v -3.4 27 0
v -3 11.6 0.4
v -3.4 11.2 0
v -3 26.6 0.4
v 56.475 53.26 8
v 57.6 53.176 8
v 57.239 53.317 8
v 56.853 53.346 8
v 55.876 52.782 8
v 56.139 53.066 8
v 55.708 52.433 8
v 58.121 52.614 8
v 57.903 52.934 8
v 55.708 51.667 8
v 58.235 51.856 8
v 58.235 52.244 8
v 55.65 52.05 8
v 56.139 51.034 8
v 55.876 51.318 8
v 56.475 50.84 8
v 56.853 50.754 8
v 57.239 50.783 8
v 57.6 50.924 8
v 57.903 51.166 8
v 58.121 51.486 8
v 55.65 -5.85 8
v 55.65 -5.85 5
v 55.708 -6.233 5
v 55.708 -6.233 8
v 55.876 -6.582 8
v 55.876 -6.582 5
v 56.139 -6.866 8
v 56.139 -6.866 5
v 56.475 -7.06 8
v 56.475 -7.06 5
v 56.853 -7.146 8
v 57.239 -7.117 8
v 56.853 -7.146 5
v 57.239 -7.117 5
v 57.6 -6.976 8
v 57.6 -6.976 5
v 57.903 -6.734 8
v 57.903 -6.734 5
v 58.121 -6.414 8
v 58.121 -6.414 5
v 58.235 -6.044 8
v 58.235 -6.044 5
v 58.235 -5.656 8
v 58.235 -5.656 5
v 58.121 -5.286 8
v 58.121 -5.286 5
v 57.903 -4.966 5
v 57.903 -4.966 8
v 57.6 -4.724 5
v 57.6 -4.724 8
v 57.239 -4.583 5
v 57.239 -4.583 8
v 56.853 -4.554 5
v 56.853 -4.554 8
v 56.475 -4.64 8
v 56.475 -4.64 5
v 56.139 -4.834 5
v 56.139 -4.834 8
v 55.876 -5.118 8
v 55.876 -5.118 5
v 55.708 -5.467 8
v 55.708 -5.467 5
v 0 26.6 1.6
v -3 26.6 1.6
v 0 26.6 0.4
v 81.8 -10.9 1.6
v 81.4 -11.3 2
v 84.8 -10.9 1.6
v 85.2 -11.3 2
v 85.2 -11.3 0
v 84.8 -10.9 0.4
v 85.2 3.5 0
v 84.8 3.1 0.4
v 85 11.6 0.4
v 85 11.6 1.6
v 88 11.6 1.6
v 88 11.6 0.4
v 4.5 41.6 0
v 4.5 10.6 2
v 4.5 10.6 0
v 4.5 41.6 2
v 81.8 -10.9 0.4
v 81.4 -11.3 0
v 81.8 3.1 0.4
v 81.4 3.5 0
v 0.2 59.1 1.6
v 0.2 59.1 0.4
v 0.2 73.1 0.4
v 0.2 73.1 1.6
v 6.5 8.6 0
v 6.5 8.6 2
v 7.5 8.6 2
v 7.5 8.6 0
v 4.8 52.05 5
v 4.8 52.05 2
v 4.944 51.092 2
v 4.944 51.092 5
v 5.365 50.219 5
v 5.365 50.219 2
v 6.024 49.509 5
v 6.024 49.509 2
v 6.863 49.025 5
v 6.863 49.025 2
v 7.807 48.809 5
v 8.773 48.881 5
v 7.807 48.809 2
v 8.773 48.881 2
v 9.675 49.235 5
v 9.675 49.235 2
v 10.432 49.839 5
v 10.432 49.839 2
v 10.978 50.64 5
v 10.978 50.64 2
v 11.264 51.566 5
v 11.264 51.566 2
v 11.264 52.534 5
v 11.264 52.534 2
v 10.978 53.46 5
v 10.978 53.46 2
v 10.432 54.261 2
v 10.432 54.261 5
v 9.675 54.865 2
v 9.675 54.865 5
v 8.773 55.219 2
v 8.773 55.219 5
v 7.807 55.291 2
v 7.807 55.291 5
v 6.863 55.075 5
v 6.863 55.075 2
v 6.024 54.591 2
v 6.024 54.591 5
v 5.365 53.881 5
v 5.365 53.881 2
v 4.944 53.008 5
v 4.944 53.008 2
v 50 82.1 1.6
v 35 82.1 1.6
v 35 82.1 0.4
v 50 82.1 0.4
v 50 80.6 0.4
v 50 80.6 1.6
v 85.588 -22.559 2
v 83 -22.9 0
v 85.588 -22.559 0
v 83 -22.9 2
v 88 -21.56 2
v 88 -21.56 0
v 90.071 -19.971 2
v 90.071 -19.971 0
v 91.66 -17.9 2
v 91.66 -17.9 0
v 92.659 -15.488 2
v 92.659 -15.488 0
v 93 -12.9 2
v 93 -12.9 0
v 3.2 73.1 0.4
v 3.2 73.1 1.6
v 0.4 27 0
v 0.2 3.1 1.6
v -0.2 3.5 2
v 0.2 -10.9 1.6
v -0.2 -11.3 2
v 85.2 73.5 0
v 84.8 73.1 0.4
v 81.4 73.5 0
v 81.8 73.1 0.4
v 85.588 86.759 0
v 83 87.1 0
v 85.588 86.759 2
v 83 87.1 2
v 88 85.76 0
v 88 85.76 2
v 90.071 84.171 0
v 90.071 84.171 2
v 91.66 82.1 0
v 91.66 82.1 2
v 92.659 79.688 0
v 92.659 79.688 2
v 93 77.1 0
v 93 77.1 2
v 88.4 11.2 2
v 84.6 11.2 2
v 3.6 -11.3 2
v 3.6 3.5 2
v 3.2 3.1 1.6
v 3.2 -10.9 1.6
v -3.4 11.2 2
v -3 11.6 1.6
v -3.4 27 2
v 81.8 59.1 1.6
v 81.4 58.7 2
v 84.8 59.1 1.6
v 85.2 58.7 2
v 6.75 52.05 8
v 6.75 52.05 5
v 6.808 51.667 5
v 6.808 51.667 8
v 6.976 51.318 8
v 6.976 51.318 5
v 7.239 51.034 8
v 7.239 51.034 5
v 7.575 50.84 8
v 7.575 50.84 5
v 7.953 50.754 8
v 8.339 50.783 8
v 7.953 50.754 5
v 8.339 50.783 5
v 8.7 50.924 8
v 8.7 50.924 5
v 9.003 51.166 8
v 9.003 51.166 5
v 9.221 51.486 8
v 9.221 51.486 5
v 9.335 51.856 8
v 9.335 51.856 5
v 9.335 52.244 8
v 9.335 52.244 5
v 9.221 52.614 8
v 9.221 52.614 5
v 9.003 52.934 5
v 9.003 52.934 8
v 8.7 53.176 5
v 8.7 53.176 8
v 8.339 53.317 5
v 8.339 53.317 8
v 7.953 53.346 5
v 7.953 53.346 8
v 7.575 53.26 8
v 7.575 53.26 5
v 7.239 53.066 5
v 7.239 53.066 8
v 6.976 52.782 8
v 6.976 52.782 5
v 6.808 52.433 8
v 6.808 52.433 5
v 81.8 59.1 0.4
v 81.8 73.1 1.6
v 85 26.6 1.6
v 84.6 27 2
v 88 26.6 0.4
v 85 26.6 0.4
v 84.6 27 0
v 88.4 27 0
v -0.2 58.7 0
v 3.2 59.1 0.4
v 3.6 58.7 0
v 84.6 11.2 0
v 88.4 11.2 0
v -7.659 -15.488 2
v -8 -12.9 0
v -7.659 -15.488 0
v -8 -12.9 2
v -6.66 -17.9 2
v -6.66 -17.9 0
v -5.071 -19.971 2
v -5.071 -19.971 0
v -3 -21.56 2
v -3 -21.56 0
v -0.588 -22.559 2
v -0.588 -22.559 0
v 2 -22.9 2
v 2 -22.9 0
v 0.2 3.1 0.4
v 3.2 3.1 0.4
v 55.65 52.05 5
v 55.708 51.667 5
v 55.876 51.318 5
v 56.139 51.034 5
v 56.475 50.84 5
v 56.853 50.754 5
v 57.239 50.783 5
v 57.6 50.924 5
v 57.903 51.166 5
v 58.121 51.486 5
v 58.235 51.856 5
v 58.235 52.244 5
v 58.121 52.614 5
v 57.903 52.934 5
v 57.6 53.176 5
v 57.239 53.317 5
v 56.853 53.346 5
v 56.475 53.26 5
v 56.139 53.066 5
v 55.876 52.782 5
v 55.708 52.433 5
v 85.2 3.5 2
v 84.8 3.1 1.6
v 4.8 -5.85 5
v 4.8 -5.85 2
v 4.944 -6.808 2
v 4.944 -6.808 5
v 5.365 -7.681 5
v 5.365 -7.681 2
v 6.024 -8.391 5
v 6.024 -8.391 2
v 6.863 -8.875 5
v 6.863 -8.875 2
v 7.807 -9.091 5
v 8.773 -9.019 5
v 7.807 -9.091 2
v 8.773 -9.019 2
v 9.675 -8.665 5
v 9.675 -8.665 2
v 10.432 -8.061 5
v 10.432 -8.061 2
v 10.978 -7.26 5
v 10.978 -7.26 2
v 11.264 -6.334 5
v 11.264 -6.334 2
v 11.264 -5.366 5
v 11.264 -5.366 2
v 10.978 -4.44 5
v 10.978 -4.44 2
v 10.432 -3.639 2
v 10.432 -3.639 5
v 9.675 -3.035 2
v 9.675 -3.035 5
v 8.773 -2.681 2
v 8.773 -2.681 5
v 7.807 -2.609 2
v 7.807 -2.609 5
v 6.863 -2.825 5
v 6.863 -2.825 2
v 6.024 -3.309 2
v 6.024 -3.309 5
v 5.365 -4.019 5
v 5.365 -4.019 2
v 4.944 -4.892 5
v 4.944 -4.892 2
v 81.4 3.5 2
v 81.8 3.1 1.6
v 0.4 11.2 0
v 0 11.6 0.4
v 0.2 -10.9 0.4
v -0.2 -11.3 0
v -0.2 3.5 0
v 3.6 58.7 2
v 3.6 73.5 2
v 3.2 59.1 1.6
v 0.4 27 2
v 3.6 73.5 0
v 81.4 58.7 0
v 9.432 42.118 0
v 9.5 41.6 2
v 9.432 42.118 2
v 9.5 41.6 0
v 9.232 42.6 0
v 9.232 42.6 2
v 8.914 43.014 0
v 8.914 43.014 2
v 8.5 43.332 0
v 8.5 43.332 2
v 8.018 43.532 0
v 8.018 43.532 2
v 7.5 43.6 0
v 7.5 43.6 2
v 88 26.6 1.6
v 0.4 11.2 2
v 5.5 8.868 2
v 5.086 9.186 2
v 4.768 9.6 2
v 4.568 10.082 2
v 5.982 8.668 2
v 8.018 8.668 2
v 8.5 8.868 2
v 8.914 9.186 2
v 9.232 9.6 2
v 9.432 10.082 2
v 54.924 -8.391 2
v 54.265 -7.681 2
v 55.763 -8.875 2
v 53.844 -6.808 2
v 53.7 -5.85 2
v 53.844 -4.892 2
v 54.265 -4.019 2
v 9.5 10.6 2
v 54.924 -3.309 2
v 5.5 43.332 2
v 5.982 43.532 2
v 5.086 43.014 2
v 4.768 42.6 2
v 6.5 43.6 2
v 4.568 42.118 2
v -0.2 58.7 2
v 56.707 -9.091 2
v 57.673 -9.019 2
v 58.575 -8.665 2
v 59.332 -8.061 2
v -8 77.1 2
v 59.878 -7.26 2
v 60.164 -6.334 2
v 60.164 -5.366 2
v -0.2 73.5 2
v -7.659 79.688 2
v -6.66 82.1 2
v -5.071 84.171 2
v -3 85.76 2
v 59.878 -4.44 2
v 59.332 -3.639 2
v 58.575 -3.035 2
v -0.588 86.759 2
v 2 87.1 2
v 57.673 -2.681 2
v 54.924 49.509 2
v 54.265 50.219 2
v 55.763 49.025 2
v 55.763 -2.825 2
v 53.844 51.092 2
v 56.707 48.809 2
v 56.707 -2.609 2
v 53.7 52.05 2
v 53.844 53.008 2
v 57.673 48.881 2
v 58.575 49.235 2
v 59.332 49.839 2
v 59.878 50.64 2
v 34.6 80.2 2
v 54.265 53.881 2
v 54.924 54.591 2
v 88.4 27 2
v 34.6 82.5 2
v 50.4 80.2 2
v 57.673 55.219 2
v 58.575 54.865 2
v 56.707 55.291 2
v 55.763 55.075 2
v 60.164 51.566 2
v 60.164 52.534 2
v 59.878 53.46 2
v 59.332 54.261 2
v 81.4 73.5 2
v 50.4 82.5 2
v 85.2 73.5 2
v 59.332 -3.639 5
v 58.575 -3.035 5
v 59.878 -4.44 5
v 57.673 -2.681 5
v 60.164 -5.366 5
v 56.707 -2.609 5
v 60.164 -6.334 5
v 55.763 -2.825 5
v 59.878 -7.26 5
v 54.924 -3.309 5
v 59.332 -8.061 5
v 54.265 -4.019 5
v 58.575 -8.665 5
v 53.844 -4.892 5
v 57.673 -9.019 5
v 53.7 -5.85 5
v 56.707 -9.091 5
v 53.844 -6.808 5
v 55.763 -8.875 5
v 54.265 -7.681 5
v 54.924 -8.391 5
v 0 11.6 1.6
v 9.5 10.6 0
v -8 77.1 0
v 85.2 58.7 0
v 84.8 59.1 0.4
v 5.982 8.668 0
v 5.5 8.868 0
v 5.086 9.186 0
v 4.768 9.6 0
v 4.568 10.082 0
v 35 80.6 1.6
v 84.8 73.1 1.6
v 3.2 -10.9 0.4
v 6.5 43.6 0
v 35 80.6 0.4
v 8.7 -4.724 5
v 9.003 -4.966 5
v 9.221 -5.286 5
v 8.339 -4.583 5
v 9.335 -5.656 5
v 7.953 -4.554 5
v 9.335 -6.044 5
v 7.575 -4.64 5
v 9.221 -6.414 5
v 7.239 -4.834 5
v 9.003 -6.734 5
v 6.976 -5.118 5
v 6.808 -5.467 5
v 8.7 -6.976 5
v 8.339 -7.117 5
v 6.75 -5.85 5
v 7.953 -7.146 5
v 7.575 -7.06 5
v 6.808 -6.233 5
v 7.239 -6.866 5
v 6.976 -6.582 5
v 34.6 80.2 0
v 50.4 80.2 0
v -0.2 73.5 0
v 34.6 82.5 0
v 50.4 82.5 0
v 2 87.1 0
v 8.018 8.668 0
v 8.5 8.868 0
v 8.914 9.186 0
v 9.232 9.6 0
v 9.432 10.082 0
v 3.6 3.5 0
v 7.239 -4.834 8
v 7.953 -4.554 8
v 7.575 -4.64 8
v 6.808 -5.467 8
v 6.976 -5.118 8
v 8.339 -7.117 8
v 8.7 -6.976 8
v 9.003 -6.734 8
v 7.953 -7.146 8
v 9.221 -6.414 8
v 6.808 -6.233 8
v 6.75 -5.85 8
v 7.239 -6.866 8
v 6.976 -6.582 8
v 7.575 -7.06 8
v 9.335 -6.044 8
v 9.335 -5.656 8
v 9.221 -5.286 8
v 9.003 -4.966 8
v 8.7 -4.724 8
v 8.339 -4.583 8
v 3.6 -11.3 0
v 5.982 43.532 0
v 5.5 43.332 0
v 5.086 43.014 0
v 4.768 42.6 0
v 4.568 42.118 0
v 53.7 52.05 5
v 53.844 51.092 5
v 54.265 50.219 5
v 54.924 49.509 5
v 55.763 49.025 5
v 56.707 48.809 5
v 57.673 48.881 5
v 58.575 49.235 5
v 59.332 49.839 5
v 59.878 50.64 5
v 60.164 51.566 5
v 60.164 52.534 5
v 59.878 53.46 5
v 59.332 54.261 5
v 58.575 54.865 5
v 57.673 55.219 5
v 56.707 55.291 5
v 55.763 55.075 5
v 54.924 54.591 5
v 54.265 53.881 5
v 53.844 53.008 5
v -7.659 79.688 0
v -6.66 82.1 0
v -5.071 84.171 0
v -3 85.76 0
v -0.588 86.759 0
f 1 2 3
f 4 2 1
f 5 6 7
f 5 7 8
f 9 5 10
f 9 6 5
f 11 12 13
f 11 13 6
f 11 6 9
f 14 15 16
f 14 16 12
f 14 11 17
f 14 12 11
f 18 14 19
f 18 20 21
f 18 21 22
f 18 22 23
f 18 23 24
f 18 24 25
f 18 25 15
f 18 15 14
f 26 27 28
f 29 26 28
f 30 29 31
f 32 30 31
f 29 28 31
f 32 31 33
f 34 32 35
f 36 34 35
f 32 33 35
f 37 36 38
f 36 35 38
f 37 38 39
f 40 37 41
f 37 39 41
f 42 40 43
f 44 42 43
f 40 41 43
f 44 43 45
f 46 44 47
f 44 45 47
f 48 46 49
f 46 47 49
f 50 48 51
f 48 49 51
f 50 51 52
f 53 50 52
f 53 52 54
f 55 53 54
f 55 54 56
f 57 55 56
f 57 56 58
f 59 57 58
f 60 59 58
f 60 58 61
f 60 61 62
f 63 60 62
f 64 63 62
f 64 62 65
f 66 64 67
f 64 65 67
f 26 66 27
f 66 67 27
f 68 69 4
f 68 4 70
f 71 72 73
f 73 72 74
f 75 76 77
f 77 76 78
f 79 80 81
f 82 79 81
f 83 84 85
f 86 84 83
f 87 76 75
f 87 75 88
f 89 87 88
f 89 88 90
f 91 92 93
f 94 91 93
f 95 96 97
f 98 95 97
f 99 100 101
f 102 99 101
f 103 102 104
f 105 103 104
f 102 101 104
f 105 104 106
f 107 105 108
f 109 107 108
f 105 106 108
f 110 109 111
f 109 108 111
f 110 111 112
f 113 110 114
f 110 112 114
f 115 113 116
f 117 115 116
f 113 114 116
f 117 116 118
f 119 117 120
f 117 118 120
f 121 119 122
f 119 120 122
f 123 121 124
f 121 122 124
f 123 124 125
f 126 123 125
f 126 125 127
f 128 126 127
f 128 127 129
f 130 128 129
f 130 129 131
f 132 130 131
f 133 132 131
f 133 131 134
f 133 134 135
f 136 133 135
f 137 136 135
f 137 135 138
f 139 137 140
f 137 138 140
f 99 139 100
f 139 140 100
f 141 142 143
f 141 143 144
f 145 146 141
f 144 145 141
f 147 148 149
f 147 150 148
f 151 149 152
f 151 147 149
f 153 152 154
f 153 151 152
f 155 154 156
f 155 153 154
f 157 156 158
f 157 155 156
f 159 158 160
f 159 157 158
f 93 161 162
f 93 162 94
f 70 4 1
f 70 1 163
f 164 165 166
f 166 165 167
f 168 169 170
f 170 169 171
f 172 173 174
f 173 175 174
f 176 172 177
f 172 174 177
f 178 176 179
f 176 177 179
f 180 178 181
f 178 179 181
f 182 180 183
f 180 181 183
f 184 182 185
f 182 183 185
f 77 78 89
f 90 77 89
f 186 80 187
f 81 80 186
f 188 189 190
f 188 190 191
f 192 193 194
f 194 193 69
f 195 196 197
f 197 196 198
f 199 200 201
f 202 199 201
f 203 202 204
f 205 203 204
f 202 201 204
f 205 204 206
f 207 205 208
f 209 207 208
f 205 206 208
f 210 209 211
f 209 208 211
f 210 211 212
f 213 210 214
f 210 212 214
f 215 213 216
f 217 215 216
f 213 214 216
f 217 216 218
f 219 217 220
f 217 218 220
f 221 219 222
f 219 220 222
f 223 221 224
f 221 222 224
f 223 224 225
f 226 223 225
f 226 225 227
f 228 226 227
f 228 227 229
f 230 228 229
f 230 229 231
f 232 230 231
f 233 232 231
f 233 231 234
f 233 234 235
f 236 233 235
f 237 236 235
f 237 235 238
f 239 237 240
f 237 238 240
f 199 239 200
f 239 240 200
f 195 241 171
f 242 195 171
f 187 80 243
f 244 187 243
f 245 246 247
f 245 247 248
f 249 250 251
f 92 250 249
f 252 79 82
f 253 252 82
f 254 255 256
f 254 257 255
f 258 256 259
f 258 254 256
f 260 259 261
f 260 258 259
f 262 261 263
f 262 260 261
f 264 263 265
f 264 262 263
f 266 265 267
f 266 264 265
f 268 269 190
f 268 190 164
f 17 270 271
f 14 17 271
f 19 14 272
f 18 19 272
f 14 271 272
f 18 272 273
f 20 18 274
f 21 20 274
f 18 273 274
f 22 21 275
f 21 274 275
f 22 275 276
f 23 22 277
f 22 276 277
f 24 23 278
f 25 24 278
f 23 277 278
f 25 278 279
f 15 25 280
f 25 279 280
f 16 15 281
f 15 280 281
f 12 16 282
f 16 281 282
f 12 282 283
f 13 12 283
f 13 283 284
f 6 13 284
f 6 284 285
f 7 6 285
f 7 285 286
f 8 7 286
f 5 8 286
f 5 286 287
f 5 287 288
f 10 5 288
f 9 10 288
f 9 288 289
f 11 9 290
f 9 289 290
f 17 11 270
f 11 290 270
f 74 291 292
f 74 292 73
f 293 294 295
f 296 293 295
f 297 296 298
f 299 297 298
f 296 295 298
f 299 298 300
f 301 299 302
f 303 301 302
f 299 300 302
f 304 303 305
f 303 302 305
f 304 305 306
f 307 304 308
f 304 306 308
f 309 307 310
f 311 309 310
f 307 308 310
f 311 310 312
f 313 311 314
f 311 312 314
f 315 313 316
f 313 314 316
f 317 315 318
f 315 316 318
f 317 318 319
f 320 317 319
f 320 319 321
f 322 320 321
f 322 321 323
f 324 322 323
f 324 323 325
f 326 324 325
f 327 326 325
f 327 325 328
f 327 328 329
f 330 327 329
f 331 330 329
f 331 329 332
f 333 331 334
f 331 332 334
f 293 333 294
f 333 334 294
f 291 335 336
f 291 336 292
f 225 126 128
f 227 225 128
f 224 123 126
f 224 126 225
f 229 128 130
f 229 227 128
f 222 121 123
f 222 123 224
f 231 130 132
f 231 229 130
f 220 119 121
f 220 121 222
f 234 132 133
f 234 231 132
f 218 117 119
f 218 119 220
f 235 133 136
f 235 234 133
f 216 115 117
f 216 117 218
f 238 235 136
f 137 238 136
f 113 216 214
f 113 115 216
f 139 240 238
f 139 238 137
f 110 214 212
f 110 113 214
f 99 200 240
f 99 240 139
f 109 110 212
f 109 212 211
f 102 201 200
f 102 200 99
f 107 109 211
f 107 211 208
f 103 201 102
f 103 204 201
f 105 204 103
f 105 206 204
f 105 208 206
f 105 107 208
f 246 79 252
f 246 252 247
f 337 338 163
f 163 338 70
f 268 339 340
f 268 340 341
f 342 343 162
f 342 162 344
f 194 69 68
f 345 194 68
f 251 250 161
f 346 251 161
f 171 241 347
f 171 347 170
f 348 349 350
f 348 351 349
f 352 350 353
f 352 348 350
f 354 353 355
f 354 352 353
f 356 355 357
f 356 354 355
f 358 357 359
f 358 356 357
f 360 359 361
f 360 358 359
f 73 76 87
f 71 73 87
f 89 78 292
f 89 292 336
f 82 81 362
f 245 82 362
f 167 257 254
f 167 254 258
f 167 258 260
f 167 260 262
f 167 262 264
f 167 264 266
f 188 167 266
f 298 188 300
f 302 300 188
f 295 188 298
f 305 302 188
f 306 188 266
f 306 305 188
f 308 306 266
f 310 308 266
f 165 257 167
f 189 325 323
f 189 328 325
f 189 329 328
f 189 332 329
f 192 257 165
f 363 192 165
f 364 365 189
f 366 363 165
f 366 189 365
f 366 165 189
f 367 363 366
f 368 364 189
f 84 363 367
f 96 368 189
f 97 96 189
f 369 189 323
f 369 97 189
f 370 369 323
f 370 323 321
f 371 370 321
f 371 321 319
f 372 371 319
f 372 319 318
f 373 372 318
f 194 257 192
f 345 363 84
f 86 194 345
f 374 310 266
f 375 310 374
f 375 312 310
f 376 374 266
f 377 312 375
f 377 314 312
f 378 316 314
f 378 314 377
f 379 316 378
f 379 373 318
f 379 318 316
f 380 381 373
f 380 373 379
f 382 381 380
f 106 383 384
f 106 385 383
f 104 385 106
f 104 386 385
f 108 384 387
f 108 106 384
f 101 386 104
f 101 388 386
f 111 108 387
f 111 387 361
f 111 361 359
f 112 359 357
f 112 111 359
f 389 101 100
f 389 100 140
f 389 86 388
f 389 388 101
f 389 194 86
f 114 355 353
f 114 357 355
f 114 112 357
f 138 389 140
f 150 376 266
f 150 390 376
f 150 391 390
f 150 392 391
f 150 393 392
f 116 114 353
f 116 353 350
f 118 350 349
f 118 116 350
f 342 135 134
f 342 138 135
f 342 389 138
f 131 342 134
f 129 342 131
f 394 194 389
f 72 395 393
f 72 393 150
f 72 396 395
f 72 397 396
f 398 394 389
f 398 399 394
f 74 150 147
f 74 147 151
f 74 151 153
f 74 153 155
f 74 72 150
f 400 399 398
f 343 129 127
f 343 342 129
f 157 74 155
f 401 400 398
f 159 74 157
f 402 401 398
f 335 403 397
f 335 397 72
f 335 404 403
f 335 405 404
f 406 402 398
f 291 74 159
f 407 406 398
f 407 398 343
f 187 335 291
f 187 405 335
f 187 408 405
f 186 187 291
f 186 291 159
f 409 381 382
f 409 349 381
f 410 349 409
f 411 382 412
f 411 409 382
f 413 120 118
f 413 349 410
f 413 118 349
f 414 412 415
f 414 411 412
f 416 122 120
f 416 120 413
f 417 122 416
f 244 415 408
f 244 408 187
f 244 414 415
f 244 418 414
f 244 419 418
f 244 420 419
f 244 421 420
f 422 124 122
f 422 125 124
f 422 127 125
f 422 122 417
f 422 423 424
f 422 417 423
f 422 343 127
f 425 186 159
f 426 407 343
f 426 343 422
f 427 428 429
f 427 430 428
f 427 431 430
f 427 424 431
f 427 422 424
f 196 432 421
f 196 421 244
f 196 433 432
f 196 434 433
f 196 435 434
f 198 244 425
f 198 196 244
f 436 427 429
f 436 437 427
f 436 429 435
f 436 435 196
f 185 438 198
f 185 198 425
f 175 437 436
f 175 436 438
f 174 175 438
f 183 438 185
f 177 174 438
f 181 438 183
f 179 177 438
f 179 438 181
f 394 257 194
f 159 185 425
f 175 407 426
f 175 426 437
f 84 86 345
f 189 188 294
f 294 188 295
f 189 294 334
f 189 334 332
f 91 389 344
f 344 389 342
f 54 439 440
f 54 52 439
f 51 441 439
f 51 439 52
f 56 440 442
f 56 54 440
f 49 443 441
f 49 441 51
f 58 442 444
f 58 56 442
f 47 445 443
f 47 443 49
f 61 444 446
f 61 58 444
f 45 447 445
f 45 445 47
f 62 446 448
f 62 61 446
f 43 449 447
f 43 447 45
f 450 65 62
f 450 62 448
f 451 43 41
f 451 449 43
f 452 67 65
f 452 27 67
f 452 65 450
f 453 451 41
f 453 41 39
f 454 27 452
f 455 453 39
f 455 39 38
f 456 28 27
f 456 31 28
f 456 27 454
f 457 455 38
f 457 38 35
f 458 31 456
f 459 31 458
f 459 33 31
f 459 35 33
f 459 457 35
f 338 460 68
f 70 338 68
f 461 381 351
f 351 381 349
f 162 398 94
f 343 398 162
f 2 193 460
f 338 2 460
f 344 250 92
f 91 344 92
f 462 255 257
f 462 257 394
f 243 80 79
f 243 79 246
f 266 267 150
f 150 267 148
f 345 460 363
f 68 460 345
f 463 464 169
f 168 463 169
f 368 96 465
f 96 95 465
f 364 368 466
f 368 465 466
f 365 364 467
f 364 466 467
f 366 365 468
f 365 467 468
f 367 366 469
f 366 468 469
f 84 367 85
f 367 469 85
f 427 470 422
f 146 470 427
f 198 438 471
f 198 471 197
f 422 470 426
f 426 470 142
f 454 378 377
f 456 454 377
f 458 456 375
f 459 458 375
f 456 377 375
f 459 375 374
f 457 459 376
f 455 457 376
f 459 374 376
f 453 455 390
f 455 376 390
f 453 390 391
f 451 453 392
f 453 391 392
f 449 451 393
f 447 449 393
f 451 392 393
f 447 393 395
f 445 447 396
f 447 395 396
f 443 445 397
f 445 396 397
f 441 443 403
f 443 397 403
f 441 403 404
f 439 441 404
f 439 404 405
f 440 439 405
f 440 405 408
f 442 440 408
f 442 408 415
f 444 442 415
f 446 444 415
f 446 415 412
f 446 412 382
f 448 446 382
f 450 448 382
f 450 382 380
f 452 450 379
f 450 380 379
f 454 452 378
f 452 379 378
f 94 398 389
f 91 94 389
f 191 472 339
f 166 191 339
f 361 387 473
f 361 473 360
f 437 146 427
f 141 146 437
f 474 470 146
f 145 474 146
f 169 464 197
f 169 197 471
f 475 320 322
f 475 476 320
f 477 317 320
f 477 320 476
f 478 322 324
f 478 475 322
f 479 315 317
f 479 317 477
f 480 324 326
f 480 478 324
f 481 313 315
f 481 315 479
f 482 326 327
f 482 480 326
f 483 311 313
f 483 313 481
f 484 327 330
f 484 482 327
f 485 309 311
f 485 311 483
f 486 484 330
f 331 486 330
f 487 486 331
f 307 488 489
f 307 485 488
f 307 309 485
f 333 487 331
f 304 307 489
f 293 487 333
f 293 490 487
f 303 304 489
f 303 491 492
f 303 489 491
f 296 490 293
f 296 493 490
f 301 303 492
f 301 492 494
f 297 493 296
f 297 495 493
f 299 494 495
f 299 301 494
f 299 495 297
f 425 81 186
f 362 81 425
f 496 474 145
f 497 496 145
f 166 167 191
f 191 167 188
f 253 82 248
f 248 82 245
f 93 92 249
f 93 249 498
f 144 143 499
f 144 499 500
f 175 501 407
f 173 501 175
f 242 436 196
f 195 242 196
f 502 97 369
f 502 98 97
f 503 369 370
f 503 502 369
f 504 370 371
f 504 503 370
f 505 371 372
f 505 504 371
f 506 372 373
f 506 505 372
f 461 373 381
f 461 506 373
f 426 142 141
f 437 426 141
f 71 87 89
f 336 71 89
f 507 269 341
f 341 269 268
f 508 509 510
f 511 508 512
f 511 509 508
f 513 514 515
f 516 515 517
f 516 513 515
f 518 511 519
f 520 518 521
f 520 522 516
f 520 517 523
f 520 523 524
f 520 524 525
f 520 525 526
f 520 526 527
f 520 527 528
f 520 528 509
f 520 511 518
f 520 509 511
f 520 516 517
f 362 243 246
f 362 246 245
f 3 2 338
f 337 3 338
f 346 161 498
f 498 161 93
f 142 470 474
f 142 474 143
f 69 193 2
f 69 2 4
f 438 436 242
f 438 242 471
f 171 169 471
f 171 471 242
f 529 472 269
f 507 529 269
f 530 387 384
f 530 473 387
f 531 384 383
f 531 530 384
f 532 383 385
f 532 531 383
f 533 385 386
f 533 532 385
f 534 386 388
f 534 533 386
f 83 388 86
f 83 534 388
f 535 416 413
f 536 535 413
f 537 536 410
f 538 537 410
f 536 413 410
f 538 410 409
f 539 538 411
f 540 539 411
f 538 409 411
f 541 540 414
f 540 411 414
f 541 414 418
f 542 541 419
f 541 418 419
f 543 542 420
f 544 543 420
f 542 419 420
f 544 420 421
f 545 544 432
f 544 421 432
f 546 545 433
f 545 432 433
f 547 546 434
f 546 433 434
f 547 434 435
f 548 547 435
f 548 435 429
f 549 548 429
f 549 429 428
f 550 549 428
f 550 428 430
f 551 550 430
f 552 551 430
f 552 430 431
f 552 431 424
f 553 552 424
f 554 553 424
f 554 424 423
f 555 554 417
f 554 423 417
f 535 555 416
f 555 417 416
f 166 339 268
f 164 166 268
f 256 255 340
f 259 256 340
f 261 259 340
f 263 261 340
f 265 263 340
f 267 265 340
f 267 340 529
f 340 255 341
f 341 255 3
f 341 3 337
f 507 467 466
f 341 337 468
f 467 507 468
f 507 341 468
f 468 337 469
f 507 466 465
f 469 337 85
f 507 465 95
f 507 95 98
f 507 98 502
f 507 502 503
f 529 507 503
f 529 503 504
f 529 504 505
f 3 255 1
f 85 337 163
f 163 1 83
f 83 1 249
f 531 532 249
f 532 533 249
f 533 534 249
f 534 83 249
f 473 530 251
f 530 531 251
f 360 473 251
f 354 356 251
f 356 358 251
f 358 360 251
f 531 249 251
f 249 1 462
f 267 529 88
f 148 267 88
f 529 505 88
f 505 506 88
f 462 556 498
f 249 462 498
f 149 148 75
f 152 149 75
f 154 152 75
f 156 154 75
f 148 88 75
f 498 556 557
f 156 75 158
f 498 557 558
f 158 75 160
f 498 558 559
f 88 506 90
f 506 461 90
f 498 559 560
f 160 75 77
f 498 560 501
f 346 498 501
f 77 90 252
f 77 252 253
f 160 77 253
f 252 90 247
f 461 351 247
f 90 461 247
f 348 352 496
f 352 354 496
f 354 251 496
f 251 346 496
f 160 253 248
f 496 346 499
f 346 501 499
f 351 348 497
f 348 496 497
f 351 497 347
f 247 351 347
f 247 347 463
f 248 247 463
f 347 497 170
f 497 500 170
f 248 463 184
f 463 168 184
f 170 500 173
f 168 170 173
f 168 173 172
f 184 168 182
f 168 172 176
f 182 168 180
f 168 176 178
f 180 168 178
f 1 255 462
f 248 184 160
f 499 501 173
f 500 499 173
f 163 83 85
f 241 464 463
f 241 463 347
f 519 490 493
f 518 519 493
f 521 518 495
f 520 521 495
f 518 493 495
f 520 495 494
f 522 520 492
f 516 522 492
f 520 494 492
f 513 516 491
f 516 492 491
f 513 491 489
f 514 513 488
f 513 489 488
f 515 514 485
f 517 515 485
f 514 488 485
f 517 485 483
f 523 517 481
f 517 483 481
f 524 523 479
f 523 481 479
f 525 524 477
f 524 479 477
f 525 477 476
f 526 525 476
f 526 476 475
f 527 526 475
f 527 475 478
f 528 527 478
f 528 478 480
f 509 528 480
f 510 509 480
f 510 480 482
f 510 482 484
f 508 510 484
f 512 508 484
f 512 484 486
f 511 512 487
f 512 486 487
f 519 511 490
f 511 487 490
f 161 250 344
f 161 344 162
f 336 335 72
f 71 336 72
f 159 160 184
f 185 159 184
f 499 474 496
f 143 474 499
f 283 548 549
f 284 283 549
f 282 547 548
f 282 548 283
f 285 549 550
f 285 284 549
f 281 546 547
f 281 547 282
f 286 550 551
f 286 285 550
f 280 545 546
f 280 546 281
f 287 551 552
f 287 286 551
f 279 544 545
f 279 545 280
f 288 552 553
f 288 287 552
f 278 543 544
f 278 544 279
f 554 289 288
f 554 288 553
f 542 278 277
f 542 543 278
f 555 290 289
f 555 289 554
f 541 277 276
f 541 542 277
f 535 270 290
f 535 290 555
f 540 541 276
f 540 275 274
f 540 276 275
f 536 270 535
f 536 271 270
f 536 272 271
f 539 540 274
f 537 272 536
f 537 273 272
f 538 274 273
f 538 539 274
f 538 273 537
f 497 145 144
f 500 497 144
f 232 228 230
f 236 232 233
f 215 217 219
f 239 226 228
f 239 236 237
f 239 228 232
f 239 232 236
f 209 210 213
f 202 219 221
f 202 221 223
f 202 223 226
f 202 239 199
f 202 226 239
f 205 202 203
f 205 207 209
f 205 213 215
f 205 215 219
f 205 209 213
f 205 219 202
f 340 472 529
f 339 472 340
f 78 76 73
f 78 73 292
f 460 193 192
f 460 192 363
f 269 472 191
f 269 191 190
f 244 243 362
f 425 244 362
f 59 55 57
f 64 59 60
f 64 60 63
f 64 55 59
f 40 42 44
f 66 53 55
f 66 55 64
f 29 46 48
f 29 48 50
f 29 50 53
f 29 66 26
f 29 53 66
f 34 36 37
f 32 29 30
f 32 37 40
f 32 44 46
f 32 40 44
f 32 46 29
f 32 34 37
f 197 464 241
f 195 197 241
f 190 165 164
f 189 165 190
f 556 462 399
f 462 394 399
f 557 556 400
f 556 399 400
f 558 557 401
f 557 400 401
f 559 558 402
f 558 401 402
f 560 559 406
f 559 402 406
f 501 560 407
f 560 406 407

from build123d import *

# Parameters (mm, degrees)
SKETCH1_W           = 101
SKETCH1_H           = 110
BOSS_EXTRUDE1_DEPTH = 2
SKETCH3_W           = 15
SKETCH3_H           = 1.5
SKETCH3_W_2         = 3
SKETCH3_H_2         = 15
CUT_EXTRUDE1_DEPTH  = 128.433943673
SKETCH7_R           = 3.25
BOSS_EXTRUDE2_DEPTH = 3
SKETCH8_R           = 1.3
BOSS_EXTRUDE3_DEPTH = 3
CHAMFER2_SIZE       = 0.4
SKETCH9_W           = 3
SKETCH9_H           = 14
CUT_EXTRUDE2_DEPTH  = 5
CHAMFER3_SIZE       = 0.4
SKETCH10_W          = 5
SKETCH10_H          = 35
CUT_EXTRUDE3_DEPTH  = 128.559437126
FILLET1_R           = 2
FILLET2_R           = 10


with BuildPart() as part:
    # Sketch1 → Boss-Extrude1 (new body)
    with BuildSketch(Plane.XY):
        with Locations((42.5, 32.1)):
            Rectangle(SKETCH1_W, SKETCH1_H)
    extrude(amount=BOSS_EXTRUDE1_DEPTH)

    # Sketch3 → Cut-Extrude1 (cut, through all)
    with BuildSketch(Plane.XY.offset(2)):
        with Locations((42.5, 81.35)):
            Rectangle(SKETCH3_W, SKETCH3_H)
        with Locations((-1.5, 19.1)):
            Rectangle(SKETCH3_W_2, SKETCH3_H_2)
        with Locations((86.5, 19.1)):
            Rectangle(SKETCH3_W_2, SKETCH3_H_2)
    extrude(amount=-CUT_EXTRUDE1_DEPTH, mode=Mode.SUBTRACT)

    # Sketch7 → Boss-Extrude2 (add)
    with BuildSketch(Plane.XY.offset(2)):
        with Locations(Location((8.05, 52.05, 0), (0, 0, 180))):
            Circle(SKETCH7_R)
        with Locations(Location((56.95, 52.05, 0), (0, 0, 180))):
            Circle(SKETCH7_R)
        with Locations(Location((8.05, -5.85, 0), (0, 0, 180))):
            Circle(SKETCH7_R)
        with Locations(Location((56.95, -5.85, 0), (0, 0, 180))):
            Circle(SKETCH7_R)
    extrude(amount=BOSS_EXTRUDE2_DEPTH)

    # Sketch8 → Boss-Extrude3 (add)
    with BuildSketch(Plane.XY.offset(5)):
        with Locations(Location((8.05, -5.85, 0), (0, 0, 180))):
            Circle(SKETCH8_R)
        with Locations(Location((56.95, -5.85, 0), (0, 0, 180))):
            Circle(SKETCH8_R)
        with Locations(Location((56.95, 52.05, 0), (0, 0, 180))):
            Circle(SKETCH8_R)
        with Locations(Location((8.05, 52.05, 0), (0, 0, 180))):
            Circle(SKETCH8_R)
    extrude(amount=BOSS_EXTRUDE3_DEPTH)

    # Chamfer2
    chamfer2_edges = [part.edges().sort_by_distance(p)[0] for p in [
        (35, 81.35, 0),
        (42.5, 82.1, 0),
        (50, 81.35, 0),
        (42.5, 80.6, 0),
        (35, 81.35, 2),
        (42.5, 80.6, 2),
        (50, 81.35, 2),
        (42.5, 82.1, 2),
        (-3, 19.1, 0),
        (-1.5, 26.6, 0),
        (0, 19.1, 0),
        (-1.5, 11.6, 0),
        (-3, 19.1, 2),
        (-1.5, 11.6, 2),
        (0, 19.1, 2),
        (-1.5, 26.6, 2),
        (85, 19.1, 0),
        (86.5, 26.6, 0),
        (88, 19.1, 0),
        (86.5, 11.6, 0),
        (85, 19.1, 2),
        (86.5, 11.6, 2),
        (88, 19.1, 2),
        (86.5, 26.6, 2),
    ]]
    chamfer(chamfer2_edges, length=CHAMFER2_SIZE)

    # Sketch9 → Cut-Extrude2 (cut)
    with BuildSketch(Plane(origin=(0, 0, 0), x_dir=(-1, 0, 0), z_dir=(0, 0, -1))):
        with Locations((-83.3, -3.9)):
            Rectangle(SKETCH9_W, SKETCH9_H)
        with Locations((-83.3, 66.1)):
            Rectangle(SKETCH9_W, SKETCH9_H)
        with Locations((-1.7, -3.9)):
            Rectangle(SKETCH9_W, SKETCH9_H)
        with Locations((-1.7, 66.1)):
            Rectangle(SKETCH9_W, SKETCH9_H)
    extrude(amount=-CUT_EXTRUDE2_DEPTH, mode=Mode.SUBTRACT)

    # Chamfer3
    chamfer3_edges = [part.edges().sort_by_distance(p)[0] for p in [
        (84.8, -3.9, 2),
        (83.3, 3.1, 2),
        (81.8, -3.9, 2),
        (83.3, -10.9, 2),
        (84.8, -3.9, 0),
        (83.3, -10.9, 0),
        (81.8, -3.9, 0),
        (83.3, 3.1, 0),
        (84.8, 66.1, 2),
        (83.3, 73.1, 2),
        (81.8, 66.1, 2),
        (83.3, 59.1, 2),
        (84.8, 66.1, 0),
        (83.3, 59.1, 0),
        (81.8, 66.1, 0),
        (83.3, 73.1, 0),
        (3.2, -3.9, 2),
        (1.7, 3.1, 2),
        (0.2, -3.9, 2),
        (1.7, -10.9, 2),
        (3.2, -3.9, 0),
        (1.7, -10.9, 0),
        (0.2, -3.9, 0),
        (1.7, 3.1, 0),
        (3.2, 66.1, 2),
        (1.7, 73.1, 2),
        (0.2, 66.1, 2),
        (1.7, 59.1, 2),
        (3.2, 66.1, 0),
        (1.7, 59.1, 0),
        (0.2, 66.1, 0),
        (1.7, 73.1, 0),
    ]]
    chamfer(chamfer3_edges, length=CHAMFER3_SIZE)

    # Sketch10 → Cut-Extrude3 (cut, through all)
    with BuildSketch(Plane.XY.offset(2)):
        with Locations((7, 26.1)):
            Rectangle(SKETCH10_W, SKETCH10_H)
    extrude(amount=-CUT_EXTRUDE3_DEPTH, mode=Mode.SUBTRACT)

    # Fillet1
    fillet1_edges = [part.edges().sort_by_distance(p)[0] for p in [
        (4.5, 8.6, 1),
        (4.5, 43.6, 1),
        (9.5, 43.6, 1),
        (9.5, 8.6, 1),
    ]]
    fillet(fillet1_edges, radius=FILLET1_R)

    # Fillet2
    fillet2_edges = [part.edges().sort_by_distance(p)[0] for p in [
        (-8, 87.1, 1),
        (93, 87.1, 1),
        (93, -22.9, 1),
        (-8, -22.9, 1),
    ]]
    fillet(fillet2_edges, radius=FILLET2_R)


solid = part.part
